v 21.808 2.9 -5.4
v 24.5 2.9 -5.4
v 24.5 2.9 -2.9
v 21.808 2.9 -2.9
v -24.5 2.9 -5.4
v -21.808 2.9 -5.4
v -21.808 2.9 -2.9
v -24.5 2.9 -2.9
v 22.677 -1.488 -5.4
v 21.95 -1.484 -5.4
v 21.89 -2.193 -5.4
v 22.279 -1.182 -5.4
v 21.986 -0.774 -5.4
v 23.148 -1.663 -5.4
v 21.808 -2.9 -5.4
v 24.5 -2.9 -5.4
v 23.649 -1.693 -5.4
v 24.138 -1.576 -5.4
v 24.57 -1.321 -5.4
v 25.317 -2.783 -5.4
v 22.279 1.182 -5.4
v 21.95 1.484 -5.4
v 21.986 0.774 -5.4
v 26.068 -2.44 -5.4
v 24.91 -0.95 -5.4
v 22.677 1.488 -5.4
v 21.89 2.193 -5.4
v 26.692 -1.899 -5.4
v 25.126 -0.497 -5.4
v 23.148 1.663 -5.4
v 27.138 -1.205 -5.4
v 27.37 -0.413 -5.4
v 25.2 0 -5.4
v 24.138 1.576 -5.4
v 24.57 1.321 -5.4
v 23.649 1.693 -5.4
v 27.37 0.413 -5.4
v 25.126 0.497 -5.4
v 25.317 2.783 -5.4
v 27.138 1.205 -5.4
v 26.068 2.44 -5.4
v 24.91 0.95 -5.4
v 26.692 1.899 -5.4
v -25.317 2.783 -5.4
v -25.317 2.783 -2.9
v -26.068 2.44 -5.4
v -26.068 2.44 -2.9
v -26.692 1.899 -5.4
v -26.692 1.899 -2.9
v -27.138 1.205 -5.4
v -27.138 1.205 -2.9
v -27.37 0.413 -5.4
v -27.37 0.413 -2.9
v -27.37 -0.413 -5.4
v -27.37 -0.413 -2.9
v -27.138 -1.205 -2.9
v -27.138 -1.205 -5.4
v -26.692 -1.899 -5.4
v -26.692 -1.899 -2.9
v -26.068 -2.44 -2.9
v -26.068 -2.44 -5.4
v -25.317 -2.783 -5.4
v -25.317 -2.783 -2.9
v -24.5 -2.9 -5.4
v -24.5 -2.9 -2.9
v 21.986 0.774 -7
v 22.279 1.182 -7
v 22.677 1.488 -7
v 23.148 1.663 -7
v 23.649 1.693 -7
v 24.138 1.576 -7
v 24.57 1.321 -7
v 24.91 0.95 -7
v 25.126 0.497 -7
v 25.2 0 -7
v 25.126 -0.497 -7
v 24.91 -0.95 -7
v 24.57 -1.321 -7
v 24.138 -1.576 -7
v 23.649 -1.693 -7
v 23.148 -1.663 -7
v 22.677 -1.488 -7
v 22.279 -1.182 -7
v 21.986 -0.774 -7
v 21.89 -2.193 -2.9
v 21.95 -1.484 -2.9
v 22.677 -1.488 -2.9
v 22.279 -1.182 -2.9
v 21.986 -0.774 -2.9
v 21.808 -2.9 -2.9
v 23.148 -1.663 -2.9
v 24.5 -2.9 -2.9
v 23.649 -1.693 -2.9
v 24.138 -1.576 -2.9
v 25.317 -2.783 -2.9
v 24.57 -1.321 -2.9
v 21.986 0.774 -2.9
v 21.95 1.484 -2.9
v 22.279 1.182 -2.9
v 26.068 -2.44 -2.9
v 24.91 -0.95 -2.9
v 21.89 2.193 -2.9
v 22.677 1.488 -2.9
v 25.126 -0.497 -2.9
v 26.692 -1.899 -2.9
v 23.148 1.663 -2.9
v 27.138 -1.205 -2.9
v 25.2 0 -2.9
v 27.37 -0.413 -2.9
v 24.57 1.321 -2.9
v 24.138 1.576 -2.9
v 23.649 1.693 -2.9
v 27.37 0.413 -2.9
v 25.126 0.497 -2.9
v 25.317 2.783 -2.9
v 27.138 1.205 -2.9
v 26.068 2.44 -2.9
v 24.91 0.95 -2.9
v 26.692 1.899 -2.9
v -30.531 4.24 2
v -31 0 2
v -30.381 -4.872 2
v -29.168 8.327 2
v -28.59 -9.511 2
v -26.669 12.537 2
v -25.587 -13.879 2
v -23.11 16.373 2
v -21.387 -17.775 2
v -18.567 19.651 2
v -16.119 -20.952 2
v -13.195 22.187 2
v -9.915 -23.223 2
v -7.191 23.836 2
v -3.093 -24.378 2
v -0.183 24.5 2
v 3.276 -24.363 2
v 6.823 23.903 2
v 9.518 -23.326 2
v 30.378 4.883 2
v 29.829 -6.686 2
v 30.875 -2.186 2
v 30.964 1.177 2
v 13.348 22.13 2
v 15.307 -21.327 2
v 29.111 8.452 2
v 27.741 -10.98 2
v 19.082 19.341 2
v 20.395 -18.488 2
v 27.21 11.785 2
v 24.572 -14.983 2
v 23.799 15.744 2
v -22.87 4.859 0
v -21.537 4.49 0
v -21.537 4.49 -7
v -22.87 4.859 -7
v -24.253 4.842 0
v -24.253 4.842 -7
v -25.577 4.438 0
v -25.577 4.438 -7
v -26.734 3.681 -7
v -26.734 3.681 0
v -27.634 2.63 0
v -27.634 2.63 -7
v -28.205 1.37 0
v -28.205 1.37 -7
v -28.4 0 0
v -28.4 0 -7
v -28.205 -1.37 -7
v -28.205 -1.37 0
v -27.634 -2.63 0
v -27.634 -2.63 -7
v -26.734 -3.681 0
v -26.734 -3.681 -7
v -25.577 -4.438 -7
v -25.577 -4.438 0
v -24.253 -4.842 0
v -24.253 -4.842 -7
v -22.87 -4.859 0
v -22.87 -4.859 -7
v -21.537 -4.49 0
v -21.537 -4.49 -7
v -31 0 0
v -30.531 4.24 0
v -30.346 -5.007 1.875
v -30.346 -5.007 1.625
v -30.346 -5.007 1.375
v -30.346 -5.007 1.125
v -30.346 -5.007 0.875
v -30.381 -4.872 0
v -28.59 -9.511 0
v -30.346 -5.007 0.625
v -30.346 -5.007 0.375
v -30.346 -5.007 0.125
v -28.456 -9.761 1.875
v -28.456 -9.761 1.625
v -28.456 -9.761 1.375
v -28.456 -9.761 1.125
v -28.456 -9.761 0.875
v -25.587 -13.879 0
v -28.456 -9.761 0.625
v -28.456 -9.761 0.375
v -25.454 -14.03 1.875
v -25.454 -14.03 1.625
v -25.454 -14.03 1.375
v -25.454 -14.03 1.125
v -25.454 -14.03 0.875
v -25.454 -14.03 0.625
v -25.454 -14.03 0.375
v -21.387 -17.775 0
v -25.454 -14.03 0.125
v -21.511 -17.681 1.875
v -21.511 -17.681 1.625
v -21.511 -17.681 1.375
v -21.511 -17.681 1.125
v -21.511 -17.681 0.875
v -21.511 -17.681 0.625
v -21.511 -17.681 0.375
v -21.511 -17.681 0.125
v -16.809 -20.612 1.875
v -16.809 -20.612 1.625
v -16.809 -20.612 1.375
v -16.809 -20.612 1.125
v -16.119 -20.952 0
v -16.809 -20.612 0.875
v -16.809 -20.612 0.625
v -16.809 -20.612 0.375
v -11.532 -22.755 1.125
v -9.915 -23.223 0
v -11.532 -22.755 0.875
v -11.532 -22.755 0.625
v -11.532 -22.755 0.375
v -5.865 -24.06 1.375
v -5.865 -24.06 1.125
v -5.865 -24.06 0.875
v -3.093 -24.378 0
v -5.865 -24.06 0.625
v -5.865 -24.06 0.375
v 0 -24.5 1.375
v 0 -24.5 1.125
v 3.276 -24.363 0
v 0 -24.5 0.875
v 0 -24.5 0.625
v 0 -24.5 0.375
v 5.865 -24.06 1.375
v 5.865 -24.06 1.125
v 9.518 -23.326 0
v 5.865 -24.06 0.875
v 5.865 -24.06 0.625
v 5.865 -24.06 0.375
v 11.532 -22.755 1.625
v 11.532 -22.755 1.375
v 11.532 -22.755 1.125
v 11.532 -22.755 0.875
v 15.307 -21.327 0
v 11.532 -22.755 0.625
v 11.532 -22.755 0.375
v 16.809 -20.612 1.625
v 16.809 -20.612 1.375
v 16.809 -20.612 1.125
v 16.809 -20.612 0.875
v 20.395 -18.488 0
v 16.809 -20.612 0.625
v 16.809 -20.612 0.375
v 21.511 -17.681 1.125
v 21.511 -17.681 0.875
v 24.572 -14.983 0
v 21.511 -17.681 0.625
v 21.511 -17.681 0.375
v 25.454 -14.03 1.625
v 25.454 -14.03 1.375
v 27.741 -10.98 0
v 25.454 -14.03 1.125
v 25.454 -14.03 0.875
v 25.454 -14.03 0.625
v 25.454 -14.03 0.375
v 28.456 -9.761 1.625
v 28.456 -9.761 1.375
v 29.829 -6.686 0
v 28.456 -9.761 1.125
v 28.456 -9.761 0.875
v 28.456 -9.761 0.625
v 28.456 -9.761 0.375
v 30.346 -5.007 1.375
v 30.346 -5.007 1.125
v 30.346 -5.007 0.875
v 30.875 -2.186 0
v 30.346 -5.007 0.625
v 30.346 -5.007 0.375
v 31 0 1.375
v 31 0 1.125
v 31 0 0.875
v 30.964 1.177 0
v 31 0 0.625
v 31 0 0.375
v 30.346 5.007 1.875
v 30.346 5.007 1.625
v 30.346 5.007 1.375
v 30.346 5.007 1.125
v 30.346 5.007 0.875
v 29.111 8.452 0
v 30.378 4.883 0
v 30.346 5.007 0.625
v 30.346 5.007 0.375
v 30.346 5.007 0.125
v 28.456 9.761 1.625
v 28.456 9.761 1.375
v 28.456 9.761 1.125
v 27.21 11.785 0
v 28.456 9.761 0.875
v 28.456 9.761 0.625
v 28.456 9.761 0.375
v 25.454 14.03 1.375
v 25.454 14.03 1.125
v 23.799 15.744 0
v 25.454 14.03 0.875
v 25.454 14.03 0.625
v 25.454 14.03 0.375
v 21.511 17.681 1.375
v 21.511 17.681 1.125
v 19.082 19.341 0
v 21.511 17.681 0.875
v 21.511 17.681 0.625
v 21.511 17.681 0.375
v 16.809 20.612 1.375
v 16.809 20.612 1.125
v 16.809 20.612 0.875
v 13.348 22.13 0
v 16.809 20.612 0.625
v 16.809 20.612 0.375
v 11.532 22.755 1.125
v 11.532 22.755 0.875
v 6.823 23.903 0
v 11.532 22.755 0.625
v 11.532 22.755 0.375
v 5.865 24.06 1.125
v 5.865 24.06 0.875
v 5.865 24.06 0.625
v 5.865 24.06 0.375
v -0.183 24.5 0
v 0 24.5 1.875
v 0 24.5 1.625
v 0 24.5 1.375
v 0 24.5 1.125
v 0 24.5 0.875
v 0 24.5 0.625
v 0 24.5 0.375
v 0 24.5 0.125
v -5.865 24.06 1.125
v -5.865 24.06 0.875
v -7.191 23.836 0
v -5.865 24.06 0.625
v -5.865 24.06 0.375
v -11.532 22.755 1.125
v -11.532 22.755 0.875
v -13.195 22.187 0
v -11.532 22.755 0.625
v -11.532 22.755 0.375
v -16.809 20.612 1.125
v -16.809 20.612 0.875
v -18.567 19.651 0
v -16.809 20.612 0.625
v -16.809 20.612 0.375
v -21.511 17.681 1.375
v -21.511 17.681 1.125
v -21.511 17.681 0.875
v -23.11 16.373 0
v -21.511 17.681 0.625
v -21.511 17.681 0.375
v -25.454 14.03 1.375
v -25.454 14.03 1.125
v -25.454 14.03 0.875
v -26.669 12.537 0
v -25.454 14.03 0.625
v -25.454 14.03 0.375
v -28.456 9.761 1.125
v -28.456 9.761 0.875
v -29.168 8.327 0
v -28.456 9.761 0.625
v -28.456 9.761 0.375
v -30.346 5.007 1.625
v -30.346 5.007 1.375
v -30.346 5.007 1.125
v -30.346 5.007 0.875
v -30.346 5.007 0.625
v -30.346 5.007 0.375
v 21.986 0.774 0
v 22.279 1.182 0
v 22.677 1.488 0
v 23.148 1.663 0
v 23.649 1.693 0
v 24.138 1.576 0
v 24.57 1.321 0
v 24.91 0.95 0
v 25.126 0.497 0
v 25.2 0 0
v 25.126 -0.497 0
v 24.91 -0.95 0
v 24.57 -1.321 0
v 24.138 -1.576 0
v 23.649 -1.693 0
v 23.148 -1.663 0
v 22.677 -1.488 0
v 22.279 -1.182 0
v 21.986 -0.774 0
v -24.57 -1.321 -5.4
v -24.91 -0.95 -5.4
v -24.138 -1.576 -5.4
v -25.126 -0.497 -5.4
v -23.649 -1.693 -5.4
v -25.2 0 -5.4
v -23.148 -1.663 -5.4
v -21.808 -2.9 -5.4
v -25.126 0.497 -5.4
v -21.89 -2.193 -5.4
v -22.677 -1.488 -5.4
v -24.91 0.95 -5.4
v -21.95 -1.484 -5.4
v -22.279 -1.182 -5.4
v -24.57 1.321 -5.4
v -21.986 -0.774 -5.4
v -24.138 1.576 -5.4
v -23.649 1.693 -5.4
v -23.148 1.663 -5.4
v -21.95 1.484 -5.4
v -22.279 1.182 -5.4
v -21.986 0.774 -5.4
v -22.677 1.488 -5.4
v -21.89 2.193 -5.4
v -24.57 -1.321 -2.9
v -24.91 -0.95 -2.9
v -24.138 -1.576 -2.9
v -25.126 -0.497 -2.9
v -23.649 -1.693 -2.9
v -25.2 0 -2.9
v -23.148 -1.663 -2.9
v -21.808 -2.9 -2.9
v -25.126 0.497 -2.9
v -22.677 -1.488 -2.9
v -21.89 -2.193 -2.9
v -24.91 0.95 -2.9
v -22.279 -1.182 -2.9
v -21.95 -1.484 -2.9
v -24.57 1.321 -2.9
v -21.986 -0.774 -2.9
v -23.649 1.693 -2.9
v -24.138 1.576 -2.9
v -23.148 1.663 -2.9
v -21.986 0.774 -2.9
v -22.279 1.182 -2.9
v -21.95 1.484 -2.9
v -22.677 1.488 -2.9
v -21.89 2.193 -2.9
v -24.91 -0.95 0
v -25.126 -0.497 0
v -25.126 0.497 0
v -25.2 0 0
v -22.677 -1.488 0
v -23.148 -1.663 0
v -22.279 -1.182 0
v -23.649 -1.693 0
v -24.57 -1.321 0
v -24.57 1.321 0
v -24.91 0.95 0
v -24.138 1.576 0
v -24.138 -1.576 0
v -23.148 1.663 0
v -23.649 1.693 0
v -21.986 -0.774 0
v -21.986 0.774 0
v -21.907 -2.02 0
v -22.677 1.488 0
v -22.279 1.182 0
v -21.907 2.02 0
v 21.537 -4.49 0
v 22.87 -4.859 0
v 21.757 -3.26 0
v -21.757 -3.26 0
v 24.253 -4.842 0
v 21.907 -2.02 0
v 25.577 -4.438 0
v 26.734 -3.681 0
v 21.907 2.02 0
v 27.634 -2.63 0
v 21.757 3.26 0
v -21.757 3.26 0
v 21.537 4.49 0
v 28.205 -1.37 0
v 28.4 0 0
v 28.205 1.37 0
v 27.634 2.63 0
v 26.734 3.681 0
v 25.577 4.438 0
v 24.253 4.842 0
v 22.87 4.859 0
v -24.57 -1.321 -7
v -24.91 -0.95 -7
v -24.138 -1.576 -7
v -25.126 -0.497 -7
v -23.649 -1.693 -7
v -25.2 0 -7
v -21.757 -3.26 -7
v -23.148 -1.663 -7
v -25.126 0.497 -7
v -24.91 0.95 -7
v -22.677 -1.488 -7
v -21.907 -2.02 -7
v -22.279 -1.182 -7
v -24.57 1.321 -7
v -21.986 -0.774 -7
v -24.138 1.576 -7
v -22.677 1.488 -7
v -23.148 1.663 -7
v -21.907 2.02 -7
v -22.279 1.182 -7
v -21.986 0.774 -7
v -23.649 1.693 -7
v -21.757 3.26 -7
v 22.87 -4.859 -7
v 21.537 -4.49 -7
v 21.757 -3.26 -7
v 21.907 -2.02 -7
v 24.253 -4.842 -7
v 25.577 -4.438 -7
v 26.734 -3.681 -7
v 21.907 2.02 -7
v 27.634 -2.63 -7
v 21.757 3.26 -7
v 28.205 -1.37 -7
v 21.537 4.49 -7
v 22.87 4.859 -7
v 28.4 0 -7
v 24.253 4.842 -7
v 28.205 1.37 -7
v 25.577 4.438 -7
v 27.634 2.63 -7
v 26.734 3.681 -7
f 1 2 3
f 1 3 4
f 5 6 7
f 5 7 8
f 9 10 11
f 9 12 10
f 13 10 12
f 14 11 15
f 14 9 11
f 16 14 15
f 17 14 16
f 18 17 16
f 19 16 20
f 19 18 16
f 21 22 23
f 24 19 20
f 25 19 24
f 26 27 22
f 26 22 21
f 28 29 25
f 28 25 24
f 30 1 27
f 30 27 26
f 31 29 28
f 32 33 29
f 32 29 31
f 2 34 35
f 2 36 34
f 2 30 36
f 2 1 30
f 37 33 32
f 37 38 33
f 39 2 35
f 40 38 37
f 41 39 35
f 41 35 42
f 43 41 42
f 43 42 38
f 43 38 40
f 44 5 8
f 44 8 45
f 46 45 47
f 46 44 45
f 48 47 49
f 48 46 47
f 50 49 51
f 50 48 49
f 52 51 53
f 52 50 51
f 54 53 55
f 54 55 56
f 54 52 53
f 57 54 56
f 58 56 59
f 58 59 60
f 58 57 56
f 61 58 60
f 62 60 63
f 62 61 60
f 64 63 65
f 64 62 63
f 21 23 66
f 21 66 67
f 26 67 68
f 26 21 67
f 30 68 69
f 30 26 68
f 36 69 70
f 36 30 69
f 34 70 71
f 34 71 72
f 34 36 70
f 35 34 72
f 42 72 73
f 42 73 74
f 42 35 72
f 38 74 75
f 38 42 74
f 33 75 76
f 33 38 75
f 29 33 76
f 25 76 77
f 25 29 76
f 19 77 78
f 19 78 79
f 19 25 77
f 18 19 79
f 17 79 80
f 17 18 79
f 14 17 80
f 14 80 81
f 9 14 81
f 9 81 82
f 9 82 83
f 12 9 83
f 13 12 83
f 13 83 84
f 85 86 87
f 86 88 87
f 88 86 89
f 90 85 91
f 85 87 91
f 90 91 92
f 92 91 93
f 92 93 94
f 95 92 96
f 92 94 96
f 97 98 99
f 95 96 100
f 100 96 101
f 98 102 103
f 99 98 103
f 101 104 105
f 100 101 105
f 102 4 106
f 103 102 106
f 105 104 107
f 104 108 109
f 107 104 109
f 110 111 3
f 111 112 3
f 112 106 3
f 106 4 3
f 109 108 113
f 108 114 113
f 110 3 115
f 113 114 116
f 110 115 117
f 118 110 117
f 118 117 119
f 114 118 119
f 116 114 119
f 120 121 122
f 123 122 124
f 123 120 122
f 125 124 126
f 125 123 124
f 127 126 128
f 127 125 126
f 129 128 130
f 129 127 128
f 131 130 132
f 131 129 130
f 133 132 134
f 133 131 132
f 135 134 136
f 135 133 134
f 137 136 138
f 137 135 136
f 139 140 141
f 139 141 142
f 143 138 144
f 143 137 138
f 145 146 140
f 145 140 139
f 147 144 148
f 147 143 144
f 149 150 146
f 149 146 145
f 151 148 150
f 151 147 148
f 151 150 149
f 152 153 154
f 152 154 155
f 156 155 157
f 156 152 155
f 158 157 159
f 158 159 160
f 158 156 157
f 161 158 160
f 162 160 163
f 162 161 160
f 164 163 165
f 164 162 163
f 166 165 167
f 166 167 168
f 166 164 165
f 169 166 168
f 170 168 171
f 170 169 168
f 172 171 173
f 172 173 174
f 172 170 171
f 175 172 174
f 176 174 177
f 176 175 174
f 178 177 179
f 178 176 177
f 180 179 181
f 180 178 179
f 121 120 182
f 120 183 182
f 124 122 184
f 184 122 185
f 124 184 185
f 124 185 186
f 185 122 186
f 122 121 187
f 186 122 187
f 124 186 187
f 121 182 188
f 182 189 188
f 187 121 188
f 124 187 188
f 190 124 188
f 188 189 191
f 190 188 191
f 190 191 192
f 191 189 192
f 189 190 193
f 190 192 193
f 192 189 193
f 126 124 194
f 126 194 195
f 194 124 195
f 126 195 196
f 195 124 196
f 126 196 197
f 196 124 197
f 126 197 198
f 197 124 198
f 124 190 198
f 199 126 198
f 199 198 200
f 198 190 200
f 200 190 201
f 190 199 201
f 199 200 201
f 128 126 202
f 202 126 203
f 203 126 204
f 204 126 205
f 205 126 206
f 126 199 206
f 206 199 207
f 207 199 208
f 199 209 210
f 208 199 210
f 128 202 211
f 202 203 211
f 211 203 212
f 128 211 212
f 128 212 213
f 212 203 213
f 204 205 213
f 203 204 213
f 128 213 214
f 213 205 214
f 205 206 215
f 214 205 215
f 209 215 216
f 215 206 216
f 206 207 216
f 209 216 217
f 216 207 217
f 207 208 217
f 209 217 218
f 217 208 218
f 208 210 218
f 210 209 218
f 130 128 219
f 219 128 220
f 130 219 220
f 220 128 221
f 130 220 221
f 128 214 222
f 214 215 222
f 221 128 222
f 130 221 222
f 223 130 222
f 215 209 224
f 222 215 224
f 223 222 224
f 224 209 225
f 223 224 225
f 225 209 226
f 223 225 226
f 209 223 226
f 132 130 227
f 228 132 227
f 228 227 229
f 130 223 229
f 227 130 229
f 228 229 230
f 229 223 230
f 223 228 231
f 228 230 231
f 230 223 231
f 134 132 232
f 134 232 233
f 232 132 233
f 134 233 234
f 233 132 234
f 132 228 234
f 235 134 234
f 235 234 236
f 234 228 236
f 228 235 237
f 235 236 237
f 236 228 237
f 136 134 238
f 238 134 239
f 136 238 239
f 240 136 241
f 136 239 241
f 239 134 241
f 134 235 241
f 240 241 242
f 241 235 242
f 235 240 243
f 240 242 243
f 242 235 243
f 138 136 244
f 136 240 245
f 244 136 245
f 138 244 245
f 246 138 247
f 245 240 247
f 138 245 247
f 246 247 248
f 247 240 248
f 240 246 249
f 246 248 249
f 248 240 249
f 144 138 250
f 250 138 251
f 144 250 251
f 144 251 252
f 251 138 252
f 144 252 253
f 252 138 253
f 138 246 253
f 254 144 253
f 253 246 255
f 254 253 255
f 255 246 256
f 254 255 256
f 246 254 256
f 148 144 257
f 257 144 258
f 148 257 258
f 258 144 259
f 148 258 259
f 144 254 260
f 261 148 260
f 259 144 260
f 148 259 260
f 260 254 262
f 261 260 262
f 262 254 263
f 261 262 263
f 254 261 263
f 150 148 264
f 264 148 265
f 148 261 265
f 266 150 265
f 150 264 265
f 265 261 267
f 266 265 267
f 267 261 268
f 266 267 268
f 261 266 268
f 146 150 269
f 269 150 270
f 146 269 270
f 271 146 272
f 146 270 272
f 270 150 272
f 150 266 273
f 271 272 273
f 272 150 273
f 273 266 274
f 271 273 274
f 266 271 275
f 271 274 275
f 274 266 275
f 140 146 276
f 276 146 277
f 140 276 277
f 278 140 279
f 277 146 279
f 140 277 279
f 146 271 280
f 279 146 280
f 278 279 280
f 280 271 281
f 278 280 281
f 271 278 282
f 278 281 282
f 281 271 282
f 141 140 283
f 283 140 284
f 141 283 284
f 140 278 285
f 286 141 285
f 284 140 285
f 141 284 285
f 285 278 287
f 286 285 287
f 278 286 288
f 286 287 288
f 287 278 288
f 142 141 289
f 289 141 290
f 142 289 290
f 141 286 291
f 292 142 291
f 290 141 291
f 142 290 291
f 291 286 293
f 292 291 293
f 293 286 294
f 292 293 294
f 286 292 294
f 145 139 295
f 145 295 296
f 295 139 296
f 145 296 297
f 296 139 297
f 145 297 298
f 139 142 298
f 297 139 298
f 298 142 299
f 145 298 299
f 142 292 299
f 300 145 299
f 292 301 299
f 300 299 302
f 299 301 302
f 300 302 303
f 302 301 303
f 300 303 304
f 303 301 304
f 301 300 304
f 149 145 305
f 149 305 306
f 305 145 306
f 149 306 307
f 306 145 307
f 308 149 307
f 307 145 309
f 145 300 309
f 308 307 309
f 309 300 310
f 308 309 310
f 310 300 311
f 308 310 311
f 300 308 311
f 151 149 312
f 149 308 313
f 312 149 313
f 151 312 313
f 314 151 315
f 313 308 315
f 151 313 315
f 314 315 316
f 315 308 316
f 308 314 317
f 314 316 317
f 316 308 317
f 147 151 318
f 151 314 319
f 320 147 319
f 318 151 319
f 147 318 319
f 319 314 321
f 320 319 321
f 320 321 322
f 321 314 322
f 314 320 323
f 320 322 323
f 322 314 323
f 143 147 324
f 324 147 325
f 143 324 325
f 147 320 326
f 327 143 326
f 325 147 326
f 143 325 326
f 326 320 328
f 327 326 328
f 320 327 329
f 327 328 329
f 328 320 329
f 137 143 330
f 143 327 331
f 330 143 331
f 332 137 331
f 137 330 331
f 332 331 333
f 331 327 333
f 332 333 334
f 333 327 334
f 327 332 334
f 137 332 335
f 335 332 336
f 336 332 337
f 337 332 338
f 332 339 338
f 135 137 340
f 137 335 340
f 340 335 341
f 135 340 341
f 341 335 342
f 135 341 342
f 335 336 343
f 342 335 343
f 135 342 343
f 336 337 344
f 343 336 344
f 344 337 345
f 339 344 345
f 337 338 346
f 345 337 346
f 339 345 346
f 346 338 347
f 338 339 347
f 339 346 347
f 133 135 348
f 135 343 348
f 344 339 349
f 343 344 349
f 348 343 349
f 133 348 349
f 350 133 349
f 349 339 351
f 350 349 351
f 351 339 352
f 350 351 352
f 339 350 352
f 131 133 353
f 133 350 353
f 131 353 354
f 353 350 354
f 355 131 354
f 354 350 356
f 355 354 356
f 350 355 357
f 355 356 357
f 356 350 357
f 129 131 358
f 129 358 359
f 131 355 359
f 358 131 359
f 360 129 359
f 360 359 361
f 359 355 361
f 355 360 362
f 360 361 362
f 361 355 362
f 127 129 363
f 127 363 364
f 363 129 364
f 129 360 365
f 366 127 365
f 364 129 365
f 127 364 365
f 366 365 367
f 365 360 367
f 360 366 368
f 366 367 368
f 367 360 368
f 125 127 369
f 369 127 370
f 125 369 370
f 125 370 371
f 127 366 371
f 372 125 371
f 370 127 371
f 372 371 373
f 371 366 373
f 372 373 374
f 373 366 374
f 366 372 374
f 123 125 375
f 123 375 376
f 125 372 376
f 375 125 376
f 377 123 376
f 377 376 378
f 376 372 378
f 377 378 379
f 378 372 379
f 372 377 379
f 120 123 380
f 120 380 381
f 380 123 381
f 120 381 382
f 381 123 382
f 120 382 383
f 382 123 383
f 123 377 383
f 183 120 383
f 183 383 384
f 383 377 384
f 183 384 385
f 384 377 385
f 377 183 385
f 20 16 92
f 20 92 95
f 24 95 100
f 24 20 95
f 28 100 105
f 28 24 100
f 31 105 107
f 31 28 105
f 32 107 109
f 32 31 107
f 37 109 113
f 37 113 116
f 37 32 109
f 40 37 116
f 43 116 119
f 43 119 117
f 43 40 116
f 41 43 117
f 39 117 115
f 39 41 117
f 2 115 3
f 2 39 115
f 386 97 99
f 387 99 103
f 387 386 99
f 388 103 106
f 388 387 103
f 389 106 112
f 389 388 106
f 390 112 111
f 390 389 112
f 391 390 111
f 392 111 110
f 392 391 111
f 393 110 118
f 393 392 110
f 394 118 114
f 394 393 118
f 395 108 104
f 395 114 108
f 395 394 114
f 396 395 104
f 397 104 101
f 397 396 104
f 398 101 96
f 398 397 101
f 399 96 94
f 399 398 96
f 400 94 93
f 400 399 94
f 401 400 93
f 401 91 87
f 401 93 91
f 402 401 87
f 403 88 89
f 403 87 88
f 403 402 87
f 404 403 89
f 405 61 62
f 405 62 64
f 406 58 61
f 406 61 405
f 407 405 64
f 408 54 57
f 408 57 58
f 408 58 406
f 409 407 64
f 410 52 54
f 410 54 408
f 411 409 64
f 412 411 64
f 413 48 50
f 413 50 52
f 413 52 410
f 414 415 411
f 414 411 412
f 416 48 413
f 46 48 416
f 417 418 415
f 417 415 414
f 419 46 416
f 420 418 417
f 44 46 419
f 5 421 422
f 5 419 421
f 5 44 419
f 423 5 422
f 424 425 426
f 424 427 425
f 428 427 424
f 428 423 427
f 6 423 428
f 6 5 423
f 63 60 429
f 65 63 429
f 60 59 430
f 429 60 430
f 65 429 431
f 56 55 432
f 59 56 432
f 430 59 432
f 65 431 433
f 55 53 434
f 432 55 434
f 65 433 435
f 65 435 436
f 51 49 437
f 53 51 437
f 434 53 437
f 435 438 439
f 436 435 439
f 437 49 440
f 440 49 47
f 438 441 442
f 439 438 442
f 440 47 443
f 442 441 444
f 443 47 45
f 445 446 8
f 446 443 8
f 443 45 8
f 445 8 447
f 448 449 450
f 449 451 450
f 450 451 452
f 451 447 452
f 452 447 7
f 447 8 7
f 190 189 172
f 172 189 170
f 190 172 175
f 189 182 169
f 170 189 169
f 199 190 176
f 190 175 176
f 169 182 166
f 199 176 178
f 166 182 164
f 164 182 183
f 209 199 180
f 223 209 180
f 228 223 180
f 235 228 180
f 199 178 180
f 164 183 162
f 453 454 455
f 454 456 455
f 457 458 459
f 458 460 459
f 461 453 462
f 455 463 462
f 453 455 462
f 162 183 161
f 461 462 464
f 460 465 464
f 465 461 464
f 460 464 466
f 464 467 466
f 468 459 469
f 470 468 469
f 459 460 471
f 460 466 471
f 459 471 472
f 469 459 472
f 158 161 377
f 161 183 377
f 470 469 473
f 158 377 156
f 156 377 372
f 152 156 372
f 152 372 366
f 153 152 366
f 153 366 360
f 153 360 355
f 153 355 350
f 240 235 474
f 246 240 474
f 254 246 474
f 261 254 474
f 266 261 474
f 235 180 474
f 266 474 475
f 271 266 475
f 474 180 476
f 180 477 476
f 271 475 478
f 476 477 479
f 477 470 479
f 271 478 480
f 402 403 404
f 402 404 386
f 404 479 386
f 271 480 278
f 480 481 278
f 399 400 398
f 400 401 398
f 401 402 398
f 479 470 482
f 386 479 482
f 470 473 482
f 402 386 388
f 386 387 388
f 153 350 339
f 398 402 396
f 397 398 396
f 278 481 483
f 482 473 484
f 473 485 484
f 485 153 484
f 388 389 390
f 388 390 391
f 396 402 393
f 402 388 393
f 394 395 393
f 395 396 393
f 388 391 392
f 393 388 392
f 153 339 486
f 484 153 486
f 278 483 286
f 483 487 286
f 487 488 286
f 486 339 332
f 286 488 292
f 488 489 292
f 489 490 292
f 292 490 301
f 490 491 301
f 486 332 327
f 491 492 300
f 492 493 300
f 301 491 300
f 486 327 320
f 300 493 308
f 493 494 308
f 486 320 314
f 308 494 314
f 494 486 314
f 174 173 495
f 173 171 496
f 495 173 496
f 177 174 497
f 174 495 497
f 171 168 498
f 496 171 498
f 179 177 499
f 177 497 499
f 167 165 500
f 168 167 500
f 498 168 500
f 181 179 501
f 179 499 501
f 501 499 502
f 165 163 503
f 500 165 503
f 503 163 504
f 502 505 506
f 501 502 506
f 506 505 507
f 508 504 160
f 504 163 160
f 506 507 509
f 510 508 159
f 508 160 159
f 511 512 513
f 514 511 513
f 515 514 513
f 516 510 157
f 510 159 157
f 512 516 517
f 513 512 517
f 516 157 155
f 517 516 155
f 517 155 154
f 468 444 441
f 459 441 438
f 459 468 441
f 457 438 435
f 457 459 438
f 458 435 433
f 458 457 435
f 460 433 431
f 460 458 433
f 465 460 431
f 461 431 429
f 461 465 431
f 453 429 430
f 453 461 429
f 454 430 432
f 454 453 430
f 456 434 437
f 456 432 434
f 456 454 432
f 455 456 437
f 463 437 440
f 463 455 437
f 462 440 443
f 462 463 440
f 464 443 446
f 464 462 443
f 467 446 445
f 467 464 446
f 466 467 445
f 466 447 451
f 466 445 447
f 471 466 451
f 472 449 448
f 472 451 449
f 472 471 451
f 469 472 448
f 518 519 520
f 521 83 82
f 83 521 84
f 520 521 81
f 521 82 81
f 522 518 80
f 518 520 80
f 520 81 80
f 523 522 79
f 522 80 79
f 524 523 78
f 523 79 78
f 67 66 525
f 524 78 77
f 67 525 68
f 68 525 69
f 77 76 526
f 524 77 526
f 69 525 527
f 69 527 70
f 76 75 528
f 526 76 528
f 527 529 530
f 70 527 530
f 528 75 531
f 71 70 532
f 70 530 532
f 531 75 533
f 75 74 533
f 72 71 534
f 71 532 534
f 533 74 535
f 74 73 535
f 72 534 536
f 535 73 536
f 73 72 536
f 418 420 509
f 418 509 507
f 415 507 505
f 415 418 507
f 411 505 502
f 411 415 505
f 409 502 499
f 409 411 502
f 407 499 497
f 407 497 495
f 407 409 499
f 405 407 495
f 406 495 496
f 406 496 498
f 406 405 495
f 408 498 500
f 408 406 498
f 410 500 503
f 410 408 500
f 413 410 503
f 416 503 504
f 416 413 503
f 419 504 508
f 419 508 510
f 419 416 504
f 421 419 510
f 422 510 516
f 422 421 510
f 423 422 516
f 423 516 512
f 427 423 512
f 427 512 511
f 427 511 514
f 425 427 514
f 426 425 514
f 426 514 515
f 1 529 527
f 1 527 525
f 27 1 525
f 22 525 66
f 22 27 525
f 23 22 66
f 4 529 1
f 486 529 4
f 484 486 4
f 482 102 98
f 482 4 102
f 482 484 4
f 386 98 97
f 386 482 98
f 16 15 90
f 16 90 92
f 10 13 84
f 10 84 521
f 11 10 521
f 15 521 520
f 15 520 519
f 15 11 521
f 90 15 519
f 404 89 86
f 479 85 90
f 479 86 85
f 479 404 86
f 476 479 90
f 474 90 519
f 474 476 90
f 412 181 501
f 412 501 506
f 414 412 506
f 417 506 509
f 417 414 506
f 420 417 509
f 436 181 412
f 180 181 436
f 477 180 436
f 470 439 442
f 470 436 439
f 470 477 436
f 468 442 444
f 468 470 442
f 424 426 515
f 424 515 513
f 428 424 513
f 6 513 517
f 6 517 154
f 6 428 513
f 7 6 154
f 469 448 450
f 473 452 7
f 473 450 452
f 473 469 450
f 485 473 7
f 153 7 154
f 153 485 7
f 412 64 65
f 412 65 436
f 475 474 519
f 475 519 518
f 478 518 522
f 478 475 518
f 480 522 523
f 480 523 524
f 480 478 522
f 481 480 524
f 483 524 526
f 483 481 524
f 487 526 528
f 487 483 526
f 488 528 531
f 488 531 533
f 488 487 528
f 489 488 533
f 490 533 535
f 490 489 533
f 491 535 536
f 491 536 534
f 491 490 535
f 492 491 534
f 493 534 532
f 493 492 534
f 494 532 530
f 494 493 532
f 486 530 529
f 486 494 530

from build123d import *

# Parameters (mm, degrees)
BOSS_EXTRUDE1_DEPTH = 2
BOSS_EXTRUDE2_DEPTH = 7
CUT_EXTRUDE3_DEPTH  = 2.5


# Read off the part's stored shape, not the designer's step: Boss-Extrude1
with BuildPart() as part:
    # Boss-Extrude1 outline → Boss-Extrude1 (new body)
    with BuildSketch(Plane.XY):
        with BuildLine():
            add(Edge.make_bspline(
                [(-31, 0), (-31, -3.366346592), (-29.206076059, -10.099039775), (-22.015870133, -18.167897158), (-11.794763727, -23.318217271), (0, -25.090891365), (11.794763727, -23.318217271), (22.015870133, -18.167897158), (29.206076059, -10.099039775), (31.896961971, 0), (29.206076059, 10.099039775), (22.015870133, 18.167897158), (11.794763727, 23.318217271), (0, 25.090891365), (-11.794763727, 23.318217271), (-22.015870133, 18.167897158), (-29.206076059, 10.099039775), (-31, 3.366346592), (-31, 0)],
                knots=[0, 0, 0, 0, 0.392699082, 0.785398163, 1.178097245, 1.570796327, 1.963495408, 2.35619449, 2.748893572, 3.141592654, 3.534291735, 3.926990817, 4.319689899, 4.71238898, 5.105088062, 5.497787144, 5.890486225, 6.283185307, 6.283185307, 6.283185307, 6.283185307], degree=3))
        make_face()
    extrude(amount=BOSS_EXTRUDE1_DEPTH)

    # Sketch3 → Boss-Extrude2 (add)
    with BuildSketch(Plane.XY):
        with BuildLine():
            ThreePointArc((-21.537021277, 4.489622983), (-28.4, 0), (-21.537021277, -4.489622983))
            ThreePointArc((-21.537021277, -4.489622983), (-21.840862575, -2.641348512), (-21.986382979, -0.773927331))
            ThreePointArc((-21.986382979, -0.773927331), (-25.2, 0), (-21.986382979, 0.773927331))
            ThreePointArc((-21.986382979, 0.773927331), (-21.840862575, 2.641348512), (-21.537021277, 4.489622983))
        make_face()
        with BuildLine():
            ThreePointArc((21.537021277, -4.489622983), (28.4, 0), (21.537021277, 4.489622983))
            ThreePointArc((21.537021277, 4.489622983), (21.840862575, 2.641348512), (21.986382979, 0.773927331))
            ThreePointArc((21.986382979, 0.773927331), (25.2, 0), (21.986382979, -0.773927331))
            ThreePointArc((21.986382979, -0.773927331), (21.840862575, -2.641348512), (21.537021277, -4.489622983))
        make_face()
    extrude(amount=-BOSS_EXTRUDE2_DEPTH)

    # Sketch4 → Cut-Extrude3 (cut)
    with BuildSketch(Plane(origin=(0, 0, -5.4), x_dir=(-1, 0, 0), z_dir=(0, 0, -1))):
        with BuildLine():
            Line((-24.5, 2.9), (24.5, 2.9))
            ThreePointArc((24.5, 2.9), (27.4, 0), (24.5, -2.9))
            Line((24.5, -2.9), (-24.5, -2.9))
            ThreePointArc((-24.5, -2.9), (-27.4, 0), (-24.5, 2.9))
        make_face()
    extrude(amount=-CUT_EXTRUDE3_DEPTH, mode=Mode.SUBTRACT)


solid = part.part
